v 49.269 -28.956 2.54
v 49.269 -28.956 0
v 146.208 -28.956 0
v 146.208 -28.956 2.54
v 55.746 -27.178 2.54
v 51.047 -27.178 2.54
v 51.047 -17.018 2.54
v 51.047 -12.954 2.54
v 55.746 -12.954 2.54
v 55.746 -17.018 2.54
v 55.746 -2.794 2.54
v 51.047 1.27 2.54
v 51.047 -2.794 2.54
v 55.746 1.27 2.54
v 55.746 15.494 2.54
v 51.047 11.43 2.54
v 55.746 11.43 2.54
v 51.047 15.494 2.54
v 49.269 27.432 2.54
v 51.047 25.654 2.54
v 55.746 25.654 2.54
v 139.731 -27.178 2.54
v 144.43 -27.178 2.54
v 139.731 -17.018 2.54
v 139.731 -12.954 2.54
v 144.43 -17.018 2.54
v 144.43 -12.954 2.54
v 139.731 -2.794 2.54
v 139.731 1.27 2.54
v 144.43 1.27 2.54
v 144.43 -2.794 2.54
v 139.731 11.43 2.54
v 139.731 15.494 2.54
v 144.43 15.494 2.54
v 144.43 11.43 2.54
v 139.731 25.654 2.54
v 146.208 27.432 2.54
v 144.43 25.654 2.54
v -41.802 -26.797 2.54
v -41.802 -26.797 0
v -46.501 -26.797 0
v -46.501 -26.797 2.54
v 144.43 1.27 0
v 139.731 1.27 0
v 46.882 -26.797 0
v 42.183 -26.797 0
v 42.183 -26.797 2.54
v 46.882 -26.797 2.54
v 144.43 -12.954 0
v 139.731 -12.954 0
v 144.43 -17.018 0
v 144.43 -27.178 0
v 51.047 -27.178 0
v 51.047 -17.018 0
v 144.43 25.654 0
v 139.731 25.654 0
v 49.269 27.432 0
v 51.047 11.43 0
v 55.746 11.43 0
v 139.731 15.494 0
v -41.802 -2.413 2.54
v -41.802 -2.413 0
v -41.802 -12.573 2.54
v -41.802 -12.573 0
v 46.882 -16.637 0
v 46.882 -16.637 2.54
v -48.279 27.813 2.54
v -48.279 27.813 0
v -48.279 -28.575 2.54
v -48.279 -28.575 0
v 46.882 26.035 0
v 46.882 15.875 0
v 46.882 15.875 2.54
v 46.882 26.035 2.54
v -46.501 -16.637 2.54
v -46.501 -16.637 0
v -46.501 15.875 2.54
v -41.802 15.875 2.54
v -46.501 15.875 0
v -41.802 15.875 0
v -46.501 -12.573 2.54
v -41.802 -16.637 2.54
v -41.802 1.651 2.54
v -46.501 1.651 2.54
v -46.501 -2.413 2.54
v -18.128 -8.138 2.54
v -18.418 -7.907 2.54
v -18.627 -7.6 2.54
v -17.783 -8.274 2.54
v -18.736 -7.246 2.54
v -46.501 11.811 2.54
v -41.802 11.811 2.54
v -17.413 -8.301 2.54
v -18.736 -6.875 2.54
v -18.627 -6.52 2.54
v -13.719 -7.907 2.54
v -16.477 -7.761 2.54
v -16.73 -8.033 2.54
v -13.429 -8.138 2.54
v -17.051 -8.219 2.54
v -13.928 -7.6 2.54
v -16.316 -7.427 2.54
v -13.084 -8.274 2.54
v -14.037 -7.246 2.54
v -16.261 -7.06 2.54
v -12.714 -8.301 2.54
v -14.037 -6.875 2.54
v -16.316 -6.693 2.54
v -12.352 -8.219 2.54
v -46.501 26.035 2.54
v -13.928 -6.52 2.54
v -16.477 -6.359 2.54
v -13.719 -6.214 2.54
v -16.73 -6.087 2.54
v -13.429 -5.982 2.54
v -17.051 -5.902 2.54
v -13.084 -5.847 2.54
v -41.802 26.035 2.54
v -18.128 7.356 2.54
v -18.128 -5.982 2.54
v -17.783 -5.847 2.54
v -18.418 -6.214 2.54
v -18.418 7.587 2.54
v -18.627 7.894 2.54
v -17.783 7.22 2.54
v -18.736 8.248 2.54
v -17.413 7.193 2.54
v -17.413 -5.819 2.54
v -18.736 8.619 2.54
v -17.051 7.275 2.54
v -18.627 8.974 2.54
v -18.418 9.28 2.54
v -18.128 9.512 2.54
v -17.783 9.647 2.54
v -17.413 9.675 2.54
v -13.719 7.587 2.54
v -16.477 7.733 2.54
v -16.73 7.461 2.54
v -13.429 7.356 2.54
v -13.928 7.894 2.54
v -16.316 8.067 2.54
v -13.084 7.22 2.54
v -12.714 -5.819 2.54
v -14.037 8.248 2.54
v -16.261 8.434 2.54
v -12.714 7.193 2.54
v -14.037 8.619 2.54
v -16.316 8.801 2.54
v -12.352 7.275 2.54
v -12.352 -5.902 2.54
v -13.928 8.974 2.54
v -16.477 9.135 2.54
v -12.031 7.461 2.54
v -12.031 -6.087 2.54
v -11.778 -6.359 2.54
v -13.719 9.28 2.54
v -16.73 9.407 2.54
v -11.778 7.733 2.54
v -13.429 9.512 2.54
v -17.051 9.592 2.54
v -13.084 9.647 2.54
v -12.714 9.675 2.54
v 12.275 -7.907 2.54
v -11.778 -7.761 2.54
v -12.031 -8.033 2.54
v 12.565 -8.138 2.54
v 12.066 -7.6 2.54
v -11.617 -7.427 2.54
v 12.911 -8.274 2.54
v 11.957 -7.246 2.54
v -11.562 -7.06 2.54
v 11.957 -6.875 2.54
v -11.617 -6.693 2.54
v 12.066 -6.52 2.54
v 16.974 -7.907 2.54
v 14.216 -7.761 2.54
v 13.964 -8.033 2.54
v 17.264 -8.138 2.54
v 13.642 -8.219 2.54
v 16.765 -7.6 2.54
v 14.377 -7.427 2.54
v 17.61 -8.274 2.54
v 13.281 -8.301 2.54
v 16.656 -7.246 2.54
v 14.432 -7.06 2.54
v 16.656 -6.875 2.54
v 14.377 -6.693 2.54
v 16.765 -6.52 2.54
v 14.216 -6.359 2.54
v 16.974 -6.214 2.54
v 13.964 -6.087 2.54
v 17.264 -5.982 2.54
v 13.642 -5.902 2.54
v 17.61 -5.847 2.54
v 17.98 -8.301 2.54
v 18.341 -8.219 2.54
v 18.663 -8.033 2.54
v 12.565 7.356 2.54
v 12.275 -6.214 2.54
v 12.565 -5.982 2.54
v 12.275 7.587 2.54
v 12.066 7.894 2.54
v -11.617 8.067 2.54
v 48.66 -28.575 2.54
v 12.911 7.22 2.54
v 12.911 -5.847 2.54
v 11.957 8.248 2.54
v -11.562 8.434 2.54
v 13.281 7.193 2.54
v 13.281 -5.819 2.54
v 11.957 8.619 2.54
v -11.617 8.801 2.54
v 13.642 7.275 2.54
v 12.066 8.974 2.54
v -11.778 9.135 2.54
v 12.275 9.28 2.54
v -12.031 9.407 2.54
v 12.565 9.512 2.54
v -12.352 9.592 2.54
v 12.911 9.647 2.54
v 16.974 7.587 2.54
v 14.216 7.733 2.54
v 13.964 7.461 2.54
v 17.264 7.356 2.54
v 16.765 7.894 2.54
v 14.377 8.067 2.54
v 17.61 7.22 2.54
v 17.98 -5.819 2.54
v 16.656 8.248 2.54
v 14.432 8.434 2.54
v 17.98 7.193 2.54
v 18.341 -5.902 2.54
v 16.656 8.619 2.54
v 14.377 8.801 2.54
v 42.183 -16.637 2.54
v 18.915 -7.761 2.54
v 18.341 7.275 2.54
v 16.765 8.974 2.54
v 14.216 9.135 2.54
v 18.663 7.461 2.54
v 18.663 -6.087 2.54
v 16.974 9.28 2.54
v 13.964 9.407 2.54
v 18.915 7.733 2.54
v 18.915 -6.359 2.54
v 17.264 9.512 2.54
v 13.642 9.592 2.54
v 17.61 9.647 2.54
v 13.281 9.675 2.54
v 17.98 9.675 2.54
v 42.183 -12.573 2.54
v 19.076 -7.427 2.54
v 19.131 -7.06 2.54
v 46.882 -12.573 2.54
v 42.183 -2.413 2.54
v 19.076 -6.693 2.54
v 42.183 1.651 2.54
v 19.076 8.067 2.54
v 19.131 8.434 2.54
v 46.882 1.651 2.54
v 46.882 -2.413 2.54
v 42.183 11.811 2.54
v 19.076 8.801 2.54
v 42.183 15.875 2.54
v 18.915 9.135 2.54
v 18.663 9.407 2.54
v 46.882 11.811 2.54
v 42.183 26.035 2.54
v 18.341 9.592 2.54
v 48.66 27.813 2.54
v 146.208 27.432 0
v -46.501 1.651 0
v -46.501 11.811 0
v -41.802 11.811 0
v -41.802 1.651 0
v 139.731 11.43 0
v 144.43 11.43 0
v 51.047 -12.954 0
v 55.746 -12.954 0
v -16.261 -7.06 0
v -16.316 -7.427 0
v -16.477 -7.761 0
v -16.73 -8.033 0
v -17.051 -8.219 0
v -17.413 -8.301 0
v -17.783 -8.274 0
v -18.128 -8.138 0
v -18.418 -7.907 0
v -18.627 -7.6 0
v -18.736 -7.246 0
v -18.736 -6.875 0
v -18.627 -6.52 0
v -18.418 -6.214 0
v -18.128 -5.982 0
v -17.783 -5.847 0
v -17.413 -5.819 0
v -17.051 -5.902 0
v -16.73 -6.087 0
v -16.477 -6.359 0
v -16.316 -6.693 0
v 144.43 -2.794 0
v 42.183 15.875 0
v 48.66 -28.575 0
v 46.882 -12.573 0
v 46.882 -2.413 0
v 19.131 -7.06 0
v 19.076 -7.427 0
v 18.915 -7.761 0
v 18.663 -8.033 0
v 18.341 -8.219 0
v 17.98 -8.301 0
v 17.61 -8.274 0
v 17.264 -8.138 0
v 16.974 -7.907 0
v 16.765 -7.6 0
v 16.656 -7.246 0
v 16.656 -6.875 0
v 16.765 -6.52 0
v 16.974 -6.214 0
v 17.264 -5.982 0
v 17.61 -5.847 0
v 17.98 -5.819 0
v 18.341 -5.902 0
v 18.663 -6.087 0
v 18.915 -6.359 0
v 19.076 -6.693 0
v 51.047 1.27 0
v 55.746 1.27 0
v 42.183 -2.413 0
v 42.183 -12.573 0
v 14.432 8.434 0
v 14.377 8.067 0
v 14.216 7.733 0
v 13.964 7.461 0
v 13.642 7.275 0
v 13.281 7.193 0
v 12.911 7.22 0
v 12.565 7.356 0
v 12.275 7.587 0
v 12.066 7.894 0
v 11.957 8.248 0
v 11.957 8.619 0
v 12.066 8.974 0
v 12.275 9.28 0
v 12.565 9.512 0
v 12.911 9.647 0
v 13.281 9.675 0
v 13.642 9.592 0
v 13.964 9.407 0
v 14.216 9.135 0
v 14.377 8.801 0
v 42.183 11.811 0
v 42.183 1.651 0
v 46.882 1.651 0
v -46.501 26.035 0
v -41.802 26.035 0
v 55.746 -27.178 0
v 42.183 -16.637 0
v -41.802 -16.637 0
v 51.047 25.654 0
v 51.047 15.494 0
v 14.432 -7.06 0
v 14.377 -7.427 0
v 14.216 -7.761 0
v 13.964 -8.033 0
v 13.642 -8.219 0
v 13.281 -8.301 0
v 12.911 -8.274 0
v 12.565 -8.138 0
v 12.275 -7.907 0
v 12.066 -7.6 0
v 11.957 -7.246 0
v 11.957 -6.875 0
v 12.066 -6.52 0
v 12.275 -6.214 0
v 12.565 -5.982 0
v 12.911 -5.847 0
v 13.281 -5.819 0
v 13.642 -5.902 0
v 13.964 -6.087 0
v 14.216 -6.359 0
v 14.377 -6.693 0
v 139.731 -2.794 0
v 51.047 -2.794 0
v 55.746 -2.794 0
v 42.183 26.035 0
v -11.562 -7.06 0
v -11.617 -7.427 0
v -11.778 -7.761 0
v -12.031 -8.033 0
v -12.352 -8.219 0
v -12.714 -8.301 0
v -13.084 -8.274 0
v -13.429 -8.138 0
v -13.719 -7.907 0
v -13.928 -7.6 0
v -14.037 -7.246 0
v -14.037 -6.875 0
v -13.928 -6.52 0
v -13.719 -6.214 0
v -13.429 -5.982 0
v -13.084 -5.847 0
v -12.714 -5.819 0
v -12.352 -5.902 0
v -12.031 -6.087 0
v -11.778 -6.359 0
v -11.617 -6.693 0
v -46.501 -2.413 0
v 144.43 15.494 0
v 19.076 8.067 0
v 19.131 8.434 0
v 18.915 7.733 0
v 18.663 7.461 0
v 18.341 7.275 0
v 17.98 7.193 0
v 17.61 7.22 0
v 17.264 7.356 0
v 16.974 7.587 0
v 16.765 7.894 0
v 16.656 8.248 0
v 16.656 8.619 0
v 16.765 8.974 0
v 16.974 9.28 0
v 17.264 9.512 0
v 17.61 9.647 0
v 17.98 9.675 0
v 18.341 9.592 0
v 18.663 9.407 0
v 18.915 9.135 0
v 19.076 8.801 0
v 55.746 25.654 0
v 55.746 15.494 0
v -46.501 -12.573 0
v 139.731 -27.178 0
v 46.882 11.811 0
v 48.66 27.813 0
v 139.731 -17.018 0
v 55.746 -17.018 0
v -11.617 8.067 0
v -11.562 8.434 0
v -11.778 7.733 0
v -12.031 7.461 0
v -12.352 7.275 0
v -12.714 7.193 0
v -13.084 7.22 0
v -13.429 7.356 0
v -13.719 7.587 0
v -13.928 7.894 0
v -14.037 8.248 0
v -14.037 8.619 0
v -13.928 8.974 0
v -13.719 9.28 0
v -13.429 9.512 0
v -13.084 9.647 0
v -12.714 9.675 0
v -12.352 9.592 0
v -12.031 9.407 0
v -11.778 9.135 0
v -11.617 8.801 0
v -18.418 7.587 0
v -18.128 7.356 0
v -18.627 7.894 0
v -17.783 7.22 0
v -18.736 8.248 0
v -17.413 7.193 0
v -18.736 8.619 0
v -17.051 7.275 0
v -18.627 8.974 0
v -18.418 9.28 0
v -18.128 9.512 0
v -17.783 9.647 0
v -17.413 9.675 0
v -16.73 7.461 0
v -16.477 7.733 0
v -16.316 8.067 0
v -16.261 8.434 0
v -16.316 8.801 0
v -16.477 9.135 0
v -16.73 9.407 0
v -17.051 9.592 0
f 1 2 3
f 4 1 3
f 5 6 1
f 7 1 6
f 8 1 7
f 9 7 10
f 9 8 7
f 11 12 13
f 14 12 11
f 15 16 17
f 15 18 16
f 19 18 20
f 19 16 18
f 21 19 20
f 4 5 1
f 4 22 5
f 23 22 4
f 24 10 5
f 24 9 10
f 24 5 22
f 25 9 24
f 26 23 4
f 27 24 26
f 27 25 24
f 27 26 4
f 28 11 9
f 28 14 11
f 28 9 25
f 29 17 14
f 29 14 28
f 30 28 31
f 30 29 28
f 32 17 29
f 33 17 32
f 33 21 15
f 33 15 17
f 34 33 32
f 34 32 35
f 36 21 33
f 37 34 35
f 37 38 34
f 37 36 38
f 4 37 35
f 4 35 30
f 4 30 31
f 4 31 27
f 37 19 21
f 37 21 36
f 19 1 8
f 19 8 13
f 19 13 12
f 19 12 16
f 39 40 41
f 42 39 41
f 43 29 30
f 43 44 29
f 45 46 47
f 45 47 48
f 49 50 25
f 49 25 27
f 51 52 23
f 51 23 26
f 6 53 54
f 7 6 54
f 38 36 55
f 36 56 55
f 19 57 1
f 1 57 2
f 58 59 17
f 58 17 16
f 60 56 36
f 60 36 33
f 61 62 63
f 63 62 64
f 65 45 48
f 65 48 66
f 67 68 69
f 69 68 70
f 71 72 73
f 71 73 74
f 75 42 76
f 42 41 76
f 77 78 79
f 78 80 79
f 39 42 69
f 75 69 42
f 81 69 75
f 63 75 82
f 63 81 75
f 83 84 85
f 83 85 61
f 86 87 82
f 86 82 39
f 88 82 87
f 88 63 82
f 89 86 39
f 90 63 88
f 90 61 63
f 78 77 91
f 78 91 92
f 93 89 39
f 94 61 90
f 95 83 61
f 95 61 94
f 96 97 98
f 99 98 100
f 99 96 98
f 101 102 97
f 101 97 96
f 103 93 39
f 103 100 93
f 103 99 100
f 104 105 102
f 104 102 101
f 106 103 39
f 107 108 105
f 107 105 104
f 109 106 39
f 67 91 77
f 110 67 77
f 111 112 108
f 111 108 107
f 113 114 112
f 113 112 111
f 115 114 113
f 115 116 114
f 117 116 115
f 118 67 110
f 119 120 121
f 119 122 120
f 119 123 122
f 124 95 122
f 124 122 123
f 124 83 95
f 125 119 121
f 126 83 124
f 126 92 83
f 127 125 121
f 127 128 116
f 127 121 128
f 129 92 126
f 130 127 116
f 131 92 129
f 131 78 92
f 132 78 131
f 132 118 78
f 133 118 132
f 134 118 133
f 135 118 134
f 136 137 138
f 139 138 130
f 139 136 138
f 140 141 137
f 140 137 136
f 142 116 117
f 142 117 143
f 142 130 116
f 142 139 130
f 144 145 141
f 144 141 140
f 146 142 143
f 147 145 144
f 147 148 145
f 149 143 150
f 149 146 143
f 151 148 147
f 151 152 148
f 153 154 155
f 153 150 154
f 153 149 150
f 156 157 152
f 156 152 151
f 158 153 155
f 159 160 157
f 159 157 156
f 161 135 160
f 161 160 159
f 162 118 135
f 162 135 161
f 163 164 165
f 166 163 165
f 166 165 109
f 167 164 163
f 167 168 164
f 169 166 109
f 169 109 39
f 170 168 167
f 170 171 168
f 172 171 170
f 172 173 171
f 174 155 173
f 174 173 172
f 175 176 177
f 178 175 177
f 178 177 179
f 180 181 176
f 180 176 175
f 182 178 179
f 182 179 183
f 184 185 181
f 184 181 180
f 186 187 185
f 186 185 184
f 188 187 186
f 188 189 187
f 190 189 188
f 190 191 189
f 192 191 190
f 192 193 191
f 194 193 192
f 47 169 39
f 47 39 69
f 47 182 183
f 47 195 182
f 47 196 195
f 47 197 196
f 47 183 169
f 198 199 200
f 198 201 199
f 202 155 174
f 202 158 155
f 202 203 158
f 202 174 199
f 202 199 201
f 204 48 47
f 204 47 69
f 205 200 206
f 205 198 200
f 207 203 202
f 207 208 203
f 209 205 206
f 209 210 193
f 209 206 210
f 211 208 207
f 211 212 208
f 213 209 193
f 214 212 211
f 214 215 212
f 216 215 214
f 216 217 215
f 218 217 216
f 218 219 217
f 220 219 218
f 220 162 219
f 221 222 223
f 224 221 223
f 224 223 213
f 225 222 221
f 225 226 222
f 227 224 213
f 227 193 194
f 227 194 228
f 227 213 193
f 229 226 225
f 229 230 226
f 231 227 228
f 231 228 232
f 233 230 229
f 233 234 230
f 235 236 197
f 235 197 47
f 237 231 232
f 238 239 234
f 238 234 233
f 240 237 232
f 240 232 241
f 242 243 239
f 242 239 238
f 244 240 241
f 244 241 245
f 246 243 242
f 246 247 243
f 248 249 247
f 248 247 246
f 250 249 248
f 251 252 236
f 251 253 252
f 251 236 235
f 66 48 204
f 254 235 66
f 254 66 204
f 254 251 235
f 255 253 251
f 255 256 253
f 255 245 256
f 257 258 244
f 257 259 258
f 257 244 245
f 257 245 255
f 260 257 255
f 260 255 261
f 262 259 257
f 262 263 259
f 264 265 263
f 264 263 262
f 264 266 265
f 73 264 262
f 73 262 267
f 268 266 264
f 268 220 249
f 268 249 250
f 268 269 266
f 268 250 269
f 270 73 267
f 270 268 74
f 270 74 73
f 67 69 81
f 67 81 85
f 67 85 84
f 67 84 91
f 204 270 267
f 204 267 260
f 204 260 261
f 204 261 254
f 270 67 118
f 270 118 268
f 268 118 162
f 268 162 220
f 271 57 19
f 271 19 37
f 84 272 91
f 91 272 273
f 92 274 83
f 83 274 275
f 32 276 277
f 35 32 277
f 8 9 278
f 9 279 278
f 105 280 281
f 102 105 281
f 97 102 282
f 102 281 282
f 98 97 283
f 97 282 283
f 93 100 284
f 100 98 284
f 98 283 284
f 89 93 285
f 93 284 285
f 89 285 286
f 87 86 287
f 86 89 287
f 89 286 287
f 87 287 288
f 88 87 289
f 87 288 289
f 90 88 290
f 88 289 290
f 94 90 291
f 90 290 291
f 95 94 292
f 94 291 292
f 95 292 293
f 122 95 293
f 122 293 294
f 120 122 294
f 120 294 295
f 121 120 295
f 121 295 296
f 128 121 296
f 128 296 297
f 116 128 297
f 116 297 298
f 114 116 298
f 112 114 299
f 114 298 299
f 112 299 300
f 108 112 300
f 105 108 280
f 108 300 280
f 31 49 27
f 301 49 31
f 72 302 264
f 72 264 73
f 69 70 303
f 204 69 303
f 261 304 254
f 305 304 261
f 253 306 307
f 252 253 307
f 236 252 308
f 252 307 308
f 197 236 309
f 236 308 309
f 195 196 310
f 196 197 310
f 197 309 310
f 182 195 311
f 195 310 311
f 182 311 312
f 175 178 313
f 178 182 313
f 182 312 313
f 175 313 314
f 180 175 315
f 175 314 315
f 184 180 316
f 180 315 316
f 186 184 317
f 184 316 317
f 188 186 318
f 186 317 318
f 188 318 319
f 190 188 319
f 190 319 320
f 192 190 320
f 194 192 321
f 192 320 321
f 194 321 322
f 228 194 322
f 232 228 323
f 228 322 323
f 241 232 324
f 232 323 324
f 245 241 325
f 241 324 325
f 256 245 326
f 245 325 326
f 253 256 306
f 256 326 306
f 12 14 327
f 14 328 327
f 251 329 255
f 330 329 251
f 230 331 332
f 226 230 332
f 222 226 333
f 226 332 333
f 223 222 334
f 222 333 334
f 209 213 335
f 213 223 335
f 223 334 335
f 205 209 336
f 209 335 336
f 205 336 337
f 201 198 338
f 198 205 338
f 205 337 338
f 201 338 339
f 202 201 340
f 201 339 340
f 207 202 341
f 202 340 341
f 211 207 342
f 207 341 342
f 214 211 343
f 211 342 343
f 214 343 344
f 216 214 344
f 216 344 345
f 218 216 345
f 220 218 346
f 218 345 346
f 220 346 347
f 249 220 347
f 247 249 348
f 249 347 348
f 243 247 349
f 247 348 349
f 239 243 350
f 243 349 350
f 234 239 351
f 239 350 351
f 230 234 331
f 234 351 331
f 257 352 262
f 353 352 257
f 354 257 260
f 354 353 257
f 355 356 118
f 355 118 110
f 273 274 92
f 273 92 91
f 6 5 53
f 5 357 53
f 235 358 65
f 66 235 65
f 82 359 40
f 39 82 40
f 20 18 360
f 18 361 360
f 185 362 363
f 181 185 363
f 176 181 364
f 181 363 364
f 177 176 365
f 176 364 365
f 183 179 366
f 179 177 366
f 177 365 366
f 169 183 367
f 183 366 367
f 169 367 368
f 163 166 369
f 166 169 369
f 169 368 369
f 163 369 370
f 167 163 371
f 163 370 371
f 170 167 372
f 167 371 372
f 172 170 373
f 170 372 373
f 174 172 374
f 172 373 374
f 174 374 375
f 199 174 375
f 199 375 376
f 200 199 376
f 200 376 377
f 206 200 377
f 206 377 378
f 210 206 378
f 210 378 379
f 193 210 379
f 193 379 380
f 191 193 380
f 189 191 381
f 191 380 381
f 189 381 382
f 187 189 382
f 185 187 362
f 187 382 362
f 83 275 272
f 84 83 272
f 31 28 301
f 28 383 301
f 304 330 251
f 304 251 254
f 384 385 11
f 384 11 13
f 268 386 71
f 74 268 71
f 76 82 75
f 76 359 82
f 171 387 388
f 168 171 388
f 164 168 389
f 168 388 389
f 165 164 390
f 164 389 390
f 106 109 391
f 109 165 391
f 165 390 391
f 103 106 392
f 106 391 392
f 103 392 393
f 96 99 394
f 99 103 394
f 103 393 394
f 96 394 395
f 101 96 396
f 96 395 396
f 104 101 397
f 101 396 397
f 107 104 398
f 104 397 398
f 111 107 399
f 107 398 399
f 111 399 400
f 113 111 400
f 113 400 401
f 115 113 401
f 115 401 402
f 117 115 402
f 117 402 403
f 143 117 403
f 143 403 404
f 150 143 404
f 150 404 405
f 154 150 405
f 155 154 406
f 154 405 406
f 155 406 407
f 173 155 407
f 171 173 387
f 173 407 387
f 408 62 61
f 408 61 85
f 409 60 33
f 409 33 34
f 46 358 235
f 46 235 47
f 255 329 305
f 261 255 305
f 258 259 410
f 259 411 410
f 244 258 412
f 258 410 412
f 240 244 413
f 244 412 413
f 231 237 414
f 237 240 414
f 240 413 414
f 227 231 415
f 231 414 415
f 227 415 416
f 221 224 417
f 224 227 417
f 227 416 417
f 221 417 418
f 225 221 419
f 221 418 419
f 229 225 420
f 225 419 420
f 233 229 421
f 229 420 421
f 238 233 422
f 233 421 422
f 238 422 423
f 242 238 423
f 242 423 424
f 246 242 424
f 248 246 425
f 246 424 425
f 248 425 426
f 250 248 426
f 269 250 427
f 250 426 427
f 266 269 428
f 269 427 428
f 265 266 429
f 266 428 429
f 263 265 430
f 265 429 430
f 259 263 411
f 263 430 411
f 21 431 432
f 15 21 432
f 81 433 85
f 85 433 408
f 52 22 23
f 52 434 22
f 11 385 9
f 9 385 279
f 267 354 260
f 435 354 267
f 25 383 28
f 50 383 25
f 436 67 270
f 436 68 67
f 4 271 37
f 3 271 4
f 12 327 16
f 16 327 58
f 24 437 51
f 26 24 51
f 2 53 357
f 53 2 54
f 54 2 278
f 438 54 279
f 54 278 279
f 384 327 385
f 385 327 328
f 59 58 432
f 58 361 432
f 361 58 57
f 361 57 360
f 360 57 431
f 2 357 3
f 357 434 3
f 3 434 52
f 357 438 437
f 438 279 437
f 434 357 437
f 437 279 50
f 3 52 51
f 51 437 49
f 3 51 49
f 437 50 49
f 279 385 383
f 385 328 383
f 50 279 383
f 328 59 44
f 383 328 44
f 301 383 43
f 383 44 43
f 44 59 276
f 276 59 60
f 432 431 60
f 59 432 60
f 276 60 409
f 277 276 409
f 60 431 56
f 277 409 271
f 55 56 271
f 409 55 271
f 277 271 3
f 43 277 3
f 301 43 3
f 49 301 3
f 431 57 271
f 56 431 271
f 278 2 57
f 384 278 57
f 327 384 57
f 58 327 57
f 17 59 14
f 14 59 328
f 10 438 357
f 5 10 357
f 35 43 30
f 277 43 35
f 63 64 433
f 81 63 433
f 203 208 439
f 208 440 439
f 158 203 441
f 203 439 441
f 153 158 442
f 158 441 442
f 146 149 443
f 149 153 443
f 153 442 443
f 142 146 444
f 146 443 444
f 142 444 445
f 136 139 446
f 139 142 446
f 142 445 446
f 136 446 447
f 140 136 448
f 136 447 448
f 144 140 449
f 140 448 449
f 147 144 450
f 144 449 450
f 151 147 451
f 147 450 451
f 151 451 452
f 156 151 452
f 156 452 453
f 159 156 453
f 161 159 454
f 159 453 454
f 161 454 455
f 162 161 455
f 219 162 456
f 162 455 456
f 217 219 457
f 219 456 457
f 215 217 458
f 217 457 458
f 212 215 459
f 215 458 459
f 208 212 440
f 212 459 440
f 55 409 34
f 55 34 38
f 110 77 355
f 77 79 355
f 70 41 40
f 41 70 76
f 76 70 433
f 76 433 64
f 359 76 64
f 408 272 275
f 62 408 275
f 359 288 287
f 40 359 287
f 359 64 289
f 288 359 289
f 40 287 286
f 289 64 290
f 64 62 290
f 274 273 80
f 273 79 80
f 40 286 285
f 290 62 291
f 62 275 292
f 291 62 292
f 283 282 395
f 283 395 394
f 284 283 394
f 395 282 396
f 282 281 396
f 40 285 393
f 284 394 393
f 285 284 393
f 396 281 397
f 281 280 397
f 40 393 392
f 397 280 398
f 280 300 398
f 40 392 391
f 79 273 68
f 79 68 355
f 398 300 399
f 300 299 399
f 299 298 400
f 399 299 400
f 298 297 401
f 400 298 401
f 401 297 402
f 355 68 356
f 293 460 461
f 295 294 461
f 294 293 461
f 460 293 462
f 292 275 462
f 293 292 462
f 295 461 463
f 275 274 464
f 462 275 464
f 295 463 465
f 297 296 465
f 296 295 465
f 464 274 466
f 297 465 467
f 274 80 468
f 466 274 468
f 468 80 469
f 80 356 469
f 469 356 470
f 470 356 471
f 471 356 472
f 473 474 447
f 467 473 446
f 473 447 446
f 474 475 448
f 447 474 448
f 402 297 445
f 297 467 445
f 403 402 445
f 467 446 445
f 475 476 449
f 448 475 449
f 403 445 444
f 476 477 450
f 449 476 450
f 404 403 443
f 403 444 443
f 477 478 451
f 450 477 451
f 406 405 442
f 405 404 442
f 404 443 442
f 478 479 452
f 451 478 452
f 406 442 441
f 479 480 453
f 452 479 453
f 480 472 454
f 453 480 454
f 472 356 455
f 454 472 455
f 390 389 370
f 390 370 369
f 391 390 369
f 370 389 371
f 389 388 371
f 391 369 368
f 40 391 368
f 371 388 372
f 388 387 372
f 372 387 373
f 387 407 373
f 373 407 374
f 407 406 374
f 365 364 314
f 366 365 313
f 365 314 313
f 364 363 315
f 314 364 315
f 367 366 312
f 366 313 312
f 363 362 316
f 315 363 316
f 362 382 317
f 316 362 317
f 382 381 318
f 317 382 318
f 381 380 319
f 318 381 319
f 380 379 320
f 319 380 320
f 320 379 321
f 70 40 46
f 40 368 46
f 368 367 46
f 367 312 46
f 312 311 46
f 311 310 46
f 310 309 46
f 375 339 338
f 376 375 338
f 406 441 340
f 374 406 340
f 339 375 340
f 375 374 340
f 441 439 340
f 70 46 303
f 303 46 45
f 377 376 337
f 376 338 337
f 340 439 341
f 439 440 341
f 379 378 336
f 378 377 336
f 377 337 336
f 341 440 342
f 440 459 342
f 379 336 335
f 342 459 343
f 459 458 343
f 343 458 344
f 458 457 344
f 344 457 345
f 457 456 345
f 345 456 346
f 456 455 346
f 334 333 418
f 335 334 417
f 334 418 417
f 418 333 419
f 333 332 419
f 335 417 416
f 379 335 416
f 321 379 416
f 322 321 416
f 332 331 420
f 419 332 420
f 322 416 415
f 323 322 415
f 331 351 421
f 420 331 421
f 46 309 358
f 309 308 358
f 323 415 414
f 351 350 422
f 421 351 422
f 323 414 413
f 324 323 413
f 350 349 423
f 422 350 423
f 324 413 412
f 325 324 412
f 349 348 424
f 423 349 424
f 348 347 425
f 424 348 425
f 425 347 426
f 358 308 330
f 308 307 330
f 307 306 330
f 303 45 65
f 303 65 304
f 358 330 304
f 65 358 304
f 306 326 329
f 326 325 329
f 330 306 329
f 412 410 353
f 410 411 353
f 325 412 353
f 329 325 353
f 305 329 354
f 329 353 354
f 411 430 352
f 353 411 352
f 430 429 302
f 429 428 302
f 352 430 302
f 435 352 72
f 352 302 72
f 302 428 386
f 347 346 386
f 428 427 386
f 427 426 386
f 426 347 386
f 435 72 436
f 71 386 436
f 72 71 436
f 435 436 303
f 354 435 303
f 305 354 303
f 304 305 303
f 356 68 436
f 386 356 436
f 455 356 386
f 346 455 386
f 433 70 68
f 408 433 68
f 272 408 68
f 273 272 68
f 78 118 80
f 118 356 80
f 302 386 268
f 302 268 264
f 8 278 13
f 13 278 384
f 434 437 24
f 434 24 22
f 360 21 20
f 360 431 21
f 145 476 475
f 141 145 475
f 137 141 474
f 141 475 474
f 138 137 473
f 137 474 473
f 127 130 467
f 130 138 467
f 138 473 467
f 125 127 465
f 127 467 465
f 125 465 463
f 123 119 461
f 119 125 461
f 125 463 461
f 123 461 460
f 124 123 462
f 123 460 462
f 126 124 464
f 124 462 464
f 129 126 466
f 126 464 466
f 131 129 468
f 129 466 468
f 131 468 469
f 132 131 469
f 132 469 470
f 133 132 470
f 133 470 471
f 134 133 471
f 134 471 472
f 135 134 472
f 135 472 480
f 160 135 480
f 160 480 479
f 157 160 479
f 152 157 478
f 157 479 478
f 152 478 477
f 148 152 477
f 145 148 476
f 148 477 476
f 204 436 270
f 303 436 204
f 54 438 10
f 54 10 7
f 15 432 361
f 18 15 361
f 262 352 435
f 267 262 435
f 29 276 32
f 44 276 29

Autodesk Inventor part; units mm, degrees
ref_plane "YZ Plane" through (0, 0, 0) normal (1, 0, 0) x (0, 1, 0)
ref_plane "XZ Plane" through (0, 0, 0) normal (0, 1, 0) x (-1, 0, 0)
ref_plane "XY Plane" through (0, 0, 0) normal (0, 0, 1) x (1, 0, 0)
sketch "Sketch1" plane through (0, 0, 0) normal (0, 0, 1) x (1, 0, 0)
  circle A0 centre (17.8867, 8.4338) radius 1.2446
  circle A1 centre (17.8867, -7.0602) radius 1.2446
  circle A2 centre (13.1877, -7.0602) radius 1.2446
  circle A3 centre (13.1877, 8.4338) radius 1.2446
  line L0 (42.1828, 26.035) -> (42.1828, 15.875)
  line L1 (42.1828, 15.875) -> (46.8818, 15.875)
  line L2 (46.8818, 15.875) -> (46.8818, 26.035)
  line L3 (42.1828, 26.035) -> (46.8818, 26.035)
  line L4 (48.6598, 27.813) -> (48.6598, -28.575)
  line L5 (42.1828, 1.651) -> (46.8818, 1.651)
  line L6 (42.1828, 11.811) -> (42.1828, 1.651)
  line L7 (46.8818, 1.651) -> (46.8818, 11.811)
  line L8 (42.1828, 11.811) -> (46.8818, 11.811)
  line L9 (42.1828, -12.573) -> (46.8818, -12.573)
  line L10 (42.1828, -2.413) -> (42.1828, -12.573)
  line L11 (46.8818, -12.573) -> (46.8818, -2.413)
  line L12 (42.1828, -2.413) -> (46.8818, -2.413)
  line L13 (42.1828, -26.797) -> (46.8818, -26.797)
  line L14 (42.1828, -16.637) -> (42.1828, -26.797)
  line L15 (46.8818, -26.797) -> (46.8818, -16.637)
  line L16 (42.1828, -16.637) -> (46.8818, -16.637)
  line L17 (-41.8018, 26.035) -> (-41.8018, 15.875)
  line L18 (-41.8018, 15.875) -> (-46.5008, 15.875)
  line L19 (-46.5008, 15.875) -> (-46.5008, 26.035)
  line L20 (-41.8018, 26.035) -> (-46.5008, 26.035)
  line L21 (-48.2788, 27.813) -> (-48.2788, -28.575)
  line L22 (-41.8018, 1.651) -> (-46.5008, 1.651)
  line L23 (-41.8018, 11.811) -> (-41.8018, 1.651)
  line L24 (-46.5008, 1.651) -> (-46.5008, 11.811)
  line L25 (-41.8018, 11.811) -> (-46.5008, 11.811)
  line L26 (-41.8018, -12.573) -> (-46.5008, -12.573)
  line L27 (-41.8018, -2.413) -> (-41.8018, -12.573)
  line L28 (-46.5008, -12.573) -> (-46.5008, -2.413)
  line L29 (-41.8018, -2.413) -> (-46.5008, -2.413)
  line L30 (-41.8018, -26.797) -> (-46.5008, -26.797)
  line L31 (-41.8018, -16.637) -> (-41.8018, -26.797)
  line L32 (-46.5008, -26.797) -> (-46.5008, -16.637)
  line L33 (-41.8018, -16.637) -> (-46.5008, -16.637)
  line L34 (-48.2788, 27.813) -> (48.6598, 27.813)
  line L35 (-48.2788, -28.575) -> (48.6598, -28.575)
  line L36 (139.7308, 25.654) -> (139.7308, 15.494)
  line L37 (139.7308, 15.494) -> (144.4298, 15.494)
  line L38 (144.4298, 15.494) -> (144.4298, 25.654)
  line L39 (139.7308, 25.654) -> (144.4298, 25.654)
  line L40 (146.2078, 27.432) -> (146.2078, -28.956)
  line L41 (139.7308, 1.27) -> (144.4298, 1.27)
  line L42 (139.7308, 11.43) -> (139.7308, 1.27)
  line L43 (144.4298, 1.27) -> (144.4298, 11.43)
  line L44 (139.7308, 11.43) -> (144.4298, 11.43)
  line L45 (139.7308, -12.954) -> (144.4298, -12.954)
  line L46 (139.7308, -2.794) -> (139.7308, -12.954)
  line L47 (144.4298, -12.954) -> (144.4298, -2.794)
  line L48 (139.7308, -2.794) -> (144.4298, -2.794)
  line L49 (139.7308, -27.178) -> (144.4298, -27.178)
  line L50 (139.7308, -17.018) -> (139.7308, -27.178)
  line L51 (144.4298, -27.178) -> (144.4298, -17.018)
  line L52 (139.7308, -17.018) -> (144.4298, -17.018)
  line L53 (55.7462, 15.494) -> (51.0472, 15.494)
  line L54 (55.7462, 25.654) -> (55.7462, 15.494)
  line L55 (51.0472, 15.494) -> (51.0472, 25.654)
  line L56 (55.7462, 25.654) -> (51.0472, 25.654)
  line L57 (55.7462, 11.43) -> (55.7462, 1.27)
  line L58 (51.0472, 1.27) -> (51.0472, 11.43)
  line L59 (55.7462, 11.43) -> (51.0472, 11.43)
  line L60 (55.7462, 1.27) -> (51.0472, 1.27)
  line L61 (55.7462, -2.794) -> (55.7462, -12.954)
  line L62 (51.0472, -12.954) -> (51.0472, -2.794)
  line L63 (55.7462, -2.794) -> (51.0472, -2.794)
  line L64 (55.7462, -12.954) -> (51.0472, -12.954)
  line L65 (55.7462, -17.018) -> (51.0472, -17.018)
  line L66 (55.7462, -17.018) -> (55.7462, -27.178)
  line L67 (51.0472, -27.178) -> (51.0472, -17.018)
  line L68 (55.7462, -27.178) -> (51.0472, -27.178)
  line L69 (49.2692, 27.432) -> (49.2692, -28.956)
  line L70 (49.2692, 27.432) -> (146.2078, 27.432)
  line L71 (49.2692, -28.956) -> (146.2078, -28.956)
  circle A4 centre (-17.5057, -7.0602) radius 1.2446
  circle A5 centre (-17.5057, 8.4338) radius 1.2446
  circle A6 centre (-12.8067, -7.0602) radius 1.2446
  circle A7 centre (-12.8067, 8.4338) radius 1.2446
  point P0 (0, 0)
  point P1 (0, 0)
  point P2 (0, 0)
  point P3 (0, 0)
  point P4 (0, 0)
  point P5 (0, 0)
  point P6 (0, 0)
  point P7 (0, 0)
  point P8 (0, 0)
  point P9 (0, 0)
  point P10 (0, 0)
  point P11 (0, 0)
  point P12 (0, 0)
  point P13 (0, 0)
  point P14 (0, 0)
  point P15 (0, 0)
  point P16 (97.548, -0.381)
  point P17 (97.548, -0.381)
  point P18 (97.548, -0.381)
  point P19 (97.548, -0.381)
  point P20 (97.548, -0.381)
  point P21 (97.548, -0.381)
  point P22 (97.548, -0.381)
  point P23 (97.548, -0.381)
  point P24 (97.548, -0.381)
  point P25 (97.548, -0.381)
  point P26 (97.548, -0.381)
  point P27 (97.548, -0.381)
  point P28 (97.548, -0.381)
  point P29 (97.548, -0.381)
  point P30 (97.548, -0.381)
  dimension "d2" = 2.4892
  dimension "d3" = 2.4892
  dimension "d5" = 15.494
  dimension "d7" = 2.4892
  dimension "d8" = 2.4892
  dimension "d9" = 15.494
  dimension "d10" = 4.699
  dimension "d19" = 4.699
  dimension "d23" = 4.699
  dimension "d24" = 10.16
  dimension "d145" = 14.224
  dimension "d190" = 10.16
  dimension "d192" = 1.778
  dimension "d212" = 1.778
  dimension "d215" = 1.778
  dimension "d216" = 4.064
  dimension "d217" = 4.064
  dimension "d218" = 4.064
  dimension "d219" = 10.16
  dimension "d220" = 10.16
  dimension "d221" = 10.16
  dimension "d222" = 4.064
  dimension "d223" = 1.778
  dimension "d268" = 4.699
  dimension "d269" = 10.16
  dimension "d270" = 14.224
  dimension "d271" = 10.16
  dimension "d272" = 1.778
  dimension "d273" = 1.778
  dimension "d274" = 1.778
  dimension "d275" = 4.064
  dimension "d276" = 4.064
  dimension "d277" = 4.064
  dimension "d278" = 10.16
  dimension "d279" = 10.16
  dimension "d280" = 10.16
  dimension "d281" = 4.064
  dimension "d282" = 1.778
extrude "Extrusion13" add sketch "Sketch1" along normal blind 2.54
properties part number "RTS New Frame"
